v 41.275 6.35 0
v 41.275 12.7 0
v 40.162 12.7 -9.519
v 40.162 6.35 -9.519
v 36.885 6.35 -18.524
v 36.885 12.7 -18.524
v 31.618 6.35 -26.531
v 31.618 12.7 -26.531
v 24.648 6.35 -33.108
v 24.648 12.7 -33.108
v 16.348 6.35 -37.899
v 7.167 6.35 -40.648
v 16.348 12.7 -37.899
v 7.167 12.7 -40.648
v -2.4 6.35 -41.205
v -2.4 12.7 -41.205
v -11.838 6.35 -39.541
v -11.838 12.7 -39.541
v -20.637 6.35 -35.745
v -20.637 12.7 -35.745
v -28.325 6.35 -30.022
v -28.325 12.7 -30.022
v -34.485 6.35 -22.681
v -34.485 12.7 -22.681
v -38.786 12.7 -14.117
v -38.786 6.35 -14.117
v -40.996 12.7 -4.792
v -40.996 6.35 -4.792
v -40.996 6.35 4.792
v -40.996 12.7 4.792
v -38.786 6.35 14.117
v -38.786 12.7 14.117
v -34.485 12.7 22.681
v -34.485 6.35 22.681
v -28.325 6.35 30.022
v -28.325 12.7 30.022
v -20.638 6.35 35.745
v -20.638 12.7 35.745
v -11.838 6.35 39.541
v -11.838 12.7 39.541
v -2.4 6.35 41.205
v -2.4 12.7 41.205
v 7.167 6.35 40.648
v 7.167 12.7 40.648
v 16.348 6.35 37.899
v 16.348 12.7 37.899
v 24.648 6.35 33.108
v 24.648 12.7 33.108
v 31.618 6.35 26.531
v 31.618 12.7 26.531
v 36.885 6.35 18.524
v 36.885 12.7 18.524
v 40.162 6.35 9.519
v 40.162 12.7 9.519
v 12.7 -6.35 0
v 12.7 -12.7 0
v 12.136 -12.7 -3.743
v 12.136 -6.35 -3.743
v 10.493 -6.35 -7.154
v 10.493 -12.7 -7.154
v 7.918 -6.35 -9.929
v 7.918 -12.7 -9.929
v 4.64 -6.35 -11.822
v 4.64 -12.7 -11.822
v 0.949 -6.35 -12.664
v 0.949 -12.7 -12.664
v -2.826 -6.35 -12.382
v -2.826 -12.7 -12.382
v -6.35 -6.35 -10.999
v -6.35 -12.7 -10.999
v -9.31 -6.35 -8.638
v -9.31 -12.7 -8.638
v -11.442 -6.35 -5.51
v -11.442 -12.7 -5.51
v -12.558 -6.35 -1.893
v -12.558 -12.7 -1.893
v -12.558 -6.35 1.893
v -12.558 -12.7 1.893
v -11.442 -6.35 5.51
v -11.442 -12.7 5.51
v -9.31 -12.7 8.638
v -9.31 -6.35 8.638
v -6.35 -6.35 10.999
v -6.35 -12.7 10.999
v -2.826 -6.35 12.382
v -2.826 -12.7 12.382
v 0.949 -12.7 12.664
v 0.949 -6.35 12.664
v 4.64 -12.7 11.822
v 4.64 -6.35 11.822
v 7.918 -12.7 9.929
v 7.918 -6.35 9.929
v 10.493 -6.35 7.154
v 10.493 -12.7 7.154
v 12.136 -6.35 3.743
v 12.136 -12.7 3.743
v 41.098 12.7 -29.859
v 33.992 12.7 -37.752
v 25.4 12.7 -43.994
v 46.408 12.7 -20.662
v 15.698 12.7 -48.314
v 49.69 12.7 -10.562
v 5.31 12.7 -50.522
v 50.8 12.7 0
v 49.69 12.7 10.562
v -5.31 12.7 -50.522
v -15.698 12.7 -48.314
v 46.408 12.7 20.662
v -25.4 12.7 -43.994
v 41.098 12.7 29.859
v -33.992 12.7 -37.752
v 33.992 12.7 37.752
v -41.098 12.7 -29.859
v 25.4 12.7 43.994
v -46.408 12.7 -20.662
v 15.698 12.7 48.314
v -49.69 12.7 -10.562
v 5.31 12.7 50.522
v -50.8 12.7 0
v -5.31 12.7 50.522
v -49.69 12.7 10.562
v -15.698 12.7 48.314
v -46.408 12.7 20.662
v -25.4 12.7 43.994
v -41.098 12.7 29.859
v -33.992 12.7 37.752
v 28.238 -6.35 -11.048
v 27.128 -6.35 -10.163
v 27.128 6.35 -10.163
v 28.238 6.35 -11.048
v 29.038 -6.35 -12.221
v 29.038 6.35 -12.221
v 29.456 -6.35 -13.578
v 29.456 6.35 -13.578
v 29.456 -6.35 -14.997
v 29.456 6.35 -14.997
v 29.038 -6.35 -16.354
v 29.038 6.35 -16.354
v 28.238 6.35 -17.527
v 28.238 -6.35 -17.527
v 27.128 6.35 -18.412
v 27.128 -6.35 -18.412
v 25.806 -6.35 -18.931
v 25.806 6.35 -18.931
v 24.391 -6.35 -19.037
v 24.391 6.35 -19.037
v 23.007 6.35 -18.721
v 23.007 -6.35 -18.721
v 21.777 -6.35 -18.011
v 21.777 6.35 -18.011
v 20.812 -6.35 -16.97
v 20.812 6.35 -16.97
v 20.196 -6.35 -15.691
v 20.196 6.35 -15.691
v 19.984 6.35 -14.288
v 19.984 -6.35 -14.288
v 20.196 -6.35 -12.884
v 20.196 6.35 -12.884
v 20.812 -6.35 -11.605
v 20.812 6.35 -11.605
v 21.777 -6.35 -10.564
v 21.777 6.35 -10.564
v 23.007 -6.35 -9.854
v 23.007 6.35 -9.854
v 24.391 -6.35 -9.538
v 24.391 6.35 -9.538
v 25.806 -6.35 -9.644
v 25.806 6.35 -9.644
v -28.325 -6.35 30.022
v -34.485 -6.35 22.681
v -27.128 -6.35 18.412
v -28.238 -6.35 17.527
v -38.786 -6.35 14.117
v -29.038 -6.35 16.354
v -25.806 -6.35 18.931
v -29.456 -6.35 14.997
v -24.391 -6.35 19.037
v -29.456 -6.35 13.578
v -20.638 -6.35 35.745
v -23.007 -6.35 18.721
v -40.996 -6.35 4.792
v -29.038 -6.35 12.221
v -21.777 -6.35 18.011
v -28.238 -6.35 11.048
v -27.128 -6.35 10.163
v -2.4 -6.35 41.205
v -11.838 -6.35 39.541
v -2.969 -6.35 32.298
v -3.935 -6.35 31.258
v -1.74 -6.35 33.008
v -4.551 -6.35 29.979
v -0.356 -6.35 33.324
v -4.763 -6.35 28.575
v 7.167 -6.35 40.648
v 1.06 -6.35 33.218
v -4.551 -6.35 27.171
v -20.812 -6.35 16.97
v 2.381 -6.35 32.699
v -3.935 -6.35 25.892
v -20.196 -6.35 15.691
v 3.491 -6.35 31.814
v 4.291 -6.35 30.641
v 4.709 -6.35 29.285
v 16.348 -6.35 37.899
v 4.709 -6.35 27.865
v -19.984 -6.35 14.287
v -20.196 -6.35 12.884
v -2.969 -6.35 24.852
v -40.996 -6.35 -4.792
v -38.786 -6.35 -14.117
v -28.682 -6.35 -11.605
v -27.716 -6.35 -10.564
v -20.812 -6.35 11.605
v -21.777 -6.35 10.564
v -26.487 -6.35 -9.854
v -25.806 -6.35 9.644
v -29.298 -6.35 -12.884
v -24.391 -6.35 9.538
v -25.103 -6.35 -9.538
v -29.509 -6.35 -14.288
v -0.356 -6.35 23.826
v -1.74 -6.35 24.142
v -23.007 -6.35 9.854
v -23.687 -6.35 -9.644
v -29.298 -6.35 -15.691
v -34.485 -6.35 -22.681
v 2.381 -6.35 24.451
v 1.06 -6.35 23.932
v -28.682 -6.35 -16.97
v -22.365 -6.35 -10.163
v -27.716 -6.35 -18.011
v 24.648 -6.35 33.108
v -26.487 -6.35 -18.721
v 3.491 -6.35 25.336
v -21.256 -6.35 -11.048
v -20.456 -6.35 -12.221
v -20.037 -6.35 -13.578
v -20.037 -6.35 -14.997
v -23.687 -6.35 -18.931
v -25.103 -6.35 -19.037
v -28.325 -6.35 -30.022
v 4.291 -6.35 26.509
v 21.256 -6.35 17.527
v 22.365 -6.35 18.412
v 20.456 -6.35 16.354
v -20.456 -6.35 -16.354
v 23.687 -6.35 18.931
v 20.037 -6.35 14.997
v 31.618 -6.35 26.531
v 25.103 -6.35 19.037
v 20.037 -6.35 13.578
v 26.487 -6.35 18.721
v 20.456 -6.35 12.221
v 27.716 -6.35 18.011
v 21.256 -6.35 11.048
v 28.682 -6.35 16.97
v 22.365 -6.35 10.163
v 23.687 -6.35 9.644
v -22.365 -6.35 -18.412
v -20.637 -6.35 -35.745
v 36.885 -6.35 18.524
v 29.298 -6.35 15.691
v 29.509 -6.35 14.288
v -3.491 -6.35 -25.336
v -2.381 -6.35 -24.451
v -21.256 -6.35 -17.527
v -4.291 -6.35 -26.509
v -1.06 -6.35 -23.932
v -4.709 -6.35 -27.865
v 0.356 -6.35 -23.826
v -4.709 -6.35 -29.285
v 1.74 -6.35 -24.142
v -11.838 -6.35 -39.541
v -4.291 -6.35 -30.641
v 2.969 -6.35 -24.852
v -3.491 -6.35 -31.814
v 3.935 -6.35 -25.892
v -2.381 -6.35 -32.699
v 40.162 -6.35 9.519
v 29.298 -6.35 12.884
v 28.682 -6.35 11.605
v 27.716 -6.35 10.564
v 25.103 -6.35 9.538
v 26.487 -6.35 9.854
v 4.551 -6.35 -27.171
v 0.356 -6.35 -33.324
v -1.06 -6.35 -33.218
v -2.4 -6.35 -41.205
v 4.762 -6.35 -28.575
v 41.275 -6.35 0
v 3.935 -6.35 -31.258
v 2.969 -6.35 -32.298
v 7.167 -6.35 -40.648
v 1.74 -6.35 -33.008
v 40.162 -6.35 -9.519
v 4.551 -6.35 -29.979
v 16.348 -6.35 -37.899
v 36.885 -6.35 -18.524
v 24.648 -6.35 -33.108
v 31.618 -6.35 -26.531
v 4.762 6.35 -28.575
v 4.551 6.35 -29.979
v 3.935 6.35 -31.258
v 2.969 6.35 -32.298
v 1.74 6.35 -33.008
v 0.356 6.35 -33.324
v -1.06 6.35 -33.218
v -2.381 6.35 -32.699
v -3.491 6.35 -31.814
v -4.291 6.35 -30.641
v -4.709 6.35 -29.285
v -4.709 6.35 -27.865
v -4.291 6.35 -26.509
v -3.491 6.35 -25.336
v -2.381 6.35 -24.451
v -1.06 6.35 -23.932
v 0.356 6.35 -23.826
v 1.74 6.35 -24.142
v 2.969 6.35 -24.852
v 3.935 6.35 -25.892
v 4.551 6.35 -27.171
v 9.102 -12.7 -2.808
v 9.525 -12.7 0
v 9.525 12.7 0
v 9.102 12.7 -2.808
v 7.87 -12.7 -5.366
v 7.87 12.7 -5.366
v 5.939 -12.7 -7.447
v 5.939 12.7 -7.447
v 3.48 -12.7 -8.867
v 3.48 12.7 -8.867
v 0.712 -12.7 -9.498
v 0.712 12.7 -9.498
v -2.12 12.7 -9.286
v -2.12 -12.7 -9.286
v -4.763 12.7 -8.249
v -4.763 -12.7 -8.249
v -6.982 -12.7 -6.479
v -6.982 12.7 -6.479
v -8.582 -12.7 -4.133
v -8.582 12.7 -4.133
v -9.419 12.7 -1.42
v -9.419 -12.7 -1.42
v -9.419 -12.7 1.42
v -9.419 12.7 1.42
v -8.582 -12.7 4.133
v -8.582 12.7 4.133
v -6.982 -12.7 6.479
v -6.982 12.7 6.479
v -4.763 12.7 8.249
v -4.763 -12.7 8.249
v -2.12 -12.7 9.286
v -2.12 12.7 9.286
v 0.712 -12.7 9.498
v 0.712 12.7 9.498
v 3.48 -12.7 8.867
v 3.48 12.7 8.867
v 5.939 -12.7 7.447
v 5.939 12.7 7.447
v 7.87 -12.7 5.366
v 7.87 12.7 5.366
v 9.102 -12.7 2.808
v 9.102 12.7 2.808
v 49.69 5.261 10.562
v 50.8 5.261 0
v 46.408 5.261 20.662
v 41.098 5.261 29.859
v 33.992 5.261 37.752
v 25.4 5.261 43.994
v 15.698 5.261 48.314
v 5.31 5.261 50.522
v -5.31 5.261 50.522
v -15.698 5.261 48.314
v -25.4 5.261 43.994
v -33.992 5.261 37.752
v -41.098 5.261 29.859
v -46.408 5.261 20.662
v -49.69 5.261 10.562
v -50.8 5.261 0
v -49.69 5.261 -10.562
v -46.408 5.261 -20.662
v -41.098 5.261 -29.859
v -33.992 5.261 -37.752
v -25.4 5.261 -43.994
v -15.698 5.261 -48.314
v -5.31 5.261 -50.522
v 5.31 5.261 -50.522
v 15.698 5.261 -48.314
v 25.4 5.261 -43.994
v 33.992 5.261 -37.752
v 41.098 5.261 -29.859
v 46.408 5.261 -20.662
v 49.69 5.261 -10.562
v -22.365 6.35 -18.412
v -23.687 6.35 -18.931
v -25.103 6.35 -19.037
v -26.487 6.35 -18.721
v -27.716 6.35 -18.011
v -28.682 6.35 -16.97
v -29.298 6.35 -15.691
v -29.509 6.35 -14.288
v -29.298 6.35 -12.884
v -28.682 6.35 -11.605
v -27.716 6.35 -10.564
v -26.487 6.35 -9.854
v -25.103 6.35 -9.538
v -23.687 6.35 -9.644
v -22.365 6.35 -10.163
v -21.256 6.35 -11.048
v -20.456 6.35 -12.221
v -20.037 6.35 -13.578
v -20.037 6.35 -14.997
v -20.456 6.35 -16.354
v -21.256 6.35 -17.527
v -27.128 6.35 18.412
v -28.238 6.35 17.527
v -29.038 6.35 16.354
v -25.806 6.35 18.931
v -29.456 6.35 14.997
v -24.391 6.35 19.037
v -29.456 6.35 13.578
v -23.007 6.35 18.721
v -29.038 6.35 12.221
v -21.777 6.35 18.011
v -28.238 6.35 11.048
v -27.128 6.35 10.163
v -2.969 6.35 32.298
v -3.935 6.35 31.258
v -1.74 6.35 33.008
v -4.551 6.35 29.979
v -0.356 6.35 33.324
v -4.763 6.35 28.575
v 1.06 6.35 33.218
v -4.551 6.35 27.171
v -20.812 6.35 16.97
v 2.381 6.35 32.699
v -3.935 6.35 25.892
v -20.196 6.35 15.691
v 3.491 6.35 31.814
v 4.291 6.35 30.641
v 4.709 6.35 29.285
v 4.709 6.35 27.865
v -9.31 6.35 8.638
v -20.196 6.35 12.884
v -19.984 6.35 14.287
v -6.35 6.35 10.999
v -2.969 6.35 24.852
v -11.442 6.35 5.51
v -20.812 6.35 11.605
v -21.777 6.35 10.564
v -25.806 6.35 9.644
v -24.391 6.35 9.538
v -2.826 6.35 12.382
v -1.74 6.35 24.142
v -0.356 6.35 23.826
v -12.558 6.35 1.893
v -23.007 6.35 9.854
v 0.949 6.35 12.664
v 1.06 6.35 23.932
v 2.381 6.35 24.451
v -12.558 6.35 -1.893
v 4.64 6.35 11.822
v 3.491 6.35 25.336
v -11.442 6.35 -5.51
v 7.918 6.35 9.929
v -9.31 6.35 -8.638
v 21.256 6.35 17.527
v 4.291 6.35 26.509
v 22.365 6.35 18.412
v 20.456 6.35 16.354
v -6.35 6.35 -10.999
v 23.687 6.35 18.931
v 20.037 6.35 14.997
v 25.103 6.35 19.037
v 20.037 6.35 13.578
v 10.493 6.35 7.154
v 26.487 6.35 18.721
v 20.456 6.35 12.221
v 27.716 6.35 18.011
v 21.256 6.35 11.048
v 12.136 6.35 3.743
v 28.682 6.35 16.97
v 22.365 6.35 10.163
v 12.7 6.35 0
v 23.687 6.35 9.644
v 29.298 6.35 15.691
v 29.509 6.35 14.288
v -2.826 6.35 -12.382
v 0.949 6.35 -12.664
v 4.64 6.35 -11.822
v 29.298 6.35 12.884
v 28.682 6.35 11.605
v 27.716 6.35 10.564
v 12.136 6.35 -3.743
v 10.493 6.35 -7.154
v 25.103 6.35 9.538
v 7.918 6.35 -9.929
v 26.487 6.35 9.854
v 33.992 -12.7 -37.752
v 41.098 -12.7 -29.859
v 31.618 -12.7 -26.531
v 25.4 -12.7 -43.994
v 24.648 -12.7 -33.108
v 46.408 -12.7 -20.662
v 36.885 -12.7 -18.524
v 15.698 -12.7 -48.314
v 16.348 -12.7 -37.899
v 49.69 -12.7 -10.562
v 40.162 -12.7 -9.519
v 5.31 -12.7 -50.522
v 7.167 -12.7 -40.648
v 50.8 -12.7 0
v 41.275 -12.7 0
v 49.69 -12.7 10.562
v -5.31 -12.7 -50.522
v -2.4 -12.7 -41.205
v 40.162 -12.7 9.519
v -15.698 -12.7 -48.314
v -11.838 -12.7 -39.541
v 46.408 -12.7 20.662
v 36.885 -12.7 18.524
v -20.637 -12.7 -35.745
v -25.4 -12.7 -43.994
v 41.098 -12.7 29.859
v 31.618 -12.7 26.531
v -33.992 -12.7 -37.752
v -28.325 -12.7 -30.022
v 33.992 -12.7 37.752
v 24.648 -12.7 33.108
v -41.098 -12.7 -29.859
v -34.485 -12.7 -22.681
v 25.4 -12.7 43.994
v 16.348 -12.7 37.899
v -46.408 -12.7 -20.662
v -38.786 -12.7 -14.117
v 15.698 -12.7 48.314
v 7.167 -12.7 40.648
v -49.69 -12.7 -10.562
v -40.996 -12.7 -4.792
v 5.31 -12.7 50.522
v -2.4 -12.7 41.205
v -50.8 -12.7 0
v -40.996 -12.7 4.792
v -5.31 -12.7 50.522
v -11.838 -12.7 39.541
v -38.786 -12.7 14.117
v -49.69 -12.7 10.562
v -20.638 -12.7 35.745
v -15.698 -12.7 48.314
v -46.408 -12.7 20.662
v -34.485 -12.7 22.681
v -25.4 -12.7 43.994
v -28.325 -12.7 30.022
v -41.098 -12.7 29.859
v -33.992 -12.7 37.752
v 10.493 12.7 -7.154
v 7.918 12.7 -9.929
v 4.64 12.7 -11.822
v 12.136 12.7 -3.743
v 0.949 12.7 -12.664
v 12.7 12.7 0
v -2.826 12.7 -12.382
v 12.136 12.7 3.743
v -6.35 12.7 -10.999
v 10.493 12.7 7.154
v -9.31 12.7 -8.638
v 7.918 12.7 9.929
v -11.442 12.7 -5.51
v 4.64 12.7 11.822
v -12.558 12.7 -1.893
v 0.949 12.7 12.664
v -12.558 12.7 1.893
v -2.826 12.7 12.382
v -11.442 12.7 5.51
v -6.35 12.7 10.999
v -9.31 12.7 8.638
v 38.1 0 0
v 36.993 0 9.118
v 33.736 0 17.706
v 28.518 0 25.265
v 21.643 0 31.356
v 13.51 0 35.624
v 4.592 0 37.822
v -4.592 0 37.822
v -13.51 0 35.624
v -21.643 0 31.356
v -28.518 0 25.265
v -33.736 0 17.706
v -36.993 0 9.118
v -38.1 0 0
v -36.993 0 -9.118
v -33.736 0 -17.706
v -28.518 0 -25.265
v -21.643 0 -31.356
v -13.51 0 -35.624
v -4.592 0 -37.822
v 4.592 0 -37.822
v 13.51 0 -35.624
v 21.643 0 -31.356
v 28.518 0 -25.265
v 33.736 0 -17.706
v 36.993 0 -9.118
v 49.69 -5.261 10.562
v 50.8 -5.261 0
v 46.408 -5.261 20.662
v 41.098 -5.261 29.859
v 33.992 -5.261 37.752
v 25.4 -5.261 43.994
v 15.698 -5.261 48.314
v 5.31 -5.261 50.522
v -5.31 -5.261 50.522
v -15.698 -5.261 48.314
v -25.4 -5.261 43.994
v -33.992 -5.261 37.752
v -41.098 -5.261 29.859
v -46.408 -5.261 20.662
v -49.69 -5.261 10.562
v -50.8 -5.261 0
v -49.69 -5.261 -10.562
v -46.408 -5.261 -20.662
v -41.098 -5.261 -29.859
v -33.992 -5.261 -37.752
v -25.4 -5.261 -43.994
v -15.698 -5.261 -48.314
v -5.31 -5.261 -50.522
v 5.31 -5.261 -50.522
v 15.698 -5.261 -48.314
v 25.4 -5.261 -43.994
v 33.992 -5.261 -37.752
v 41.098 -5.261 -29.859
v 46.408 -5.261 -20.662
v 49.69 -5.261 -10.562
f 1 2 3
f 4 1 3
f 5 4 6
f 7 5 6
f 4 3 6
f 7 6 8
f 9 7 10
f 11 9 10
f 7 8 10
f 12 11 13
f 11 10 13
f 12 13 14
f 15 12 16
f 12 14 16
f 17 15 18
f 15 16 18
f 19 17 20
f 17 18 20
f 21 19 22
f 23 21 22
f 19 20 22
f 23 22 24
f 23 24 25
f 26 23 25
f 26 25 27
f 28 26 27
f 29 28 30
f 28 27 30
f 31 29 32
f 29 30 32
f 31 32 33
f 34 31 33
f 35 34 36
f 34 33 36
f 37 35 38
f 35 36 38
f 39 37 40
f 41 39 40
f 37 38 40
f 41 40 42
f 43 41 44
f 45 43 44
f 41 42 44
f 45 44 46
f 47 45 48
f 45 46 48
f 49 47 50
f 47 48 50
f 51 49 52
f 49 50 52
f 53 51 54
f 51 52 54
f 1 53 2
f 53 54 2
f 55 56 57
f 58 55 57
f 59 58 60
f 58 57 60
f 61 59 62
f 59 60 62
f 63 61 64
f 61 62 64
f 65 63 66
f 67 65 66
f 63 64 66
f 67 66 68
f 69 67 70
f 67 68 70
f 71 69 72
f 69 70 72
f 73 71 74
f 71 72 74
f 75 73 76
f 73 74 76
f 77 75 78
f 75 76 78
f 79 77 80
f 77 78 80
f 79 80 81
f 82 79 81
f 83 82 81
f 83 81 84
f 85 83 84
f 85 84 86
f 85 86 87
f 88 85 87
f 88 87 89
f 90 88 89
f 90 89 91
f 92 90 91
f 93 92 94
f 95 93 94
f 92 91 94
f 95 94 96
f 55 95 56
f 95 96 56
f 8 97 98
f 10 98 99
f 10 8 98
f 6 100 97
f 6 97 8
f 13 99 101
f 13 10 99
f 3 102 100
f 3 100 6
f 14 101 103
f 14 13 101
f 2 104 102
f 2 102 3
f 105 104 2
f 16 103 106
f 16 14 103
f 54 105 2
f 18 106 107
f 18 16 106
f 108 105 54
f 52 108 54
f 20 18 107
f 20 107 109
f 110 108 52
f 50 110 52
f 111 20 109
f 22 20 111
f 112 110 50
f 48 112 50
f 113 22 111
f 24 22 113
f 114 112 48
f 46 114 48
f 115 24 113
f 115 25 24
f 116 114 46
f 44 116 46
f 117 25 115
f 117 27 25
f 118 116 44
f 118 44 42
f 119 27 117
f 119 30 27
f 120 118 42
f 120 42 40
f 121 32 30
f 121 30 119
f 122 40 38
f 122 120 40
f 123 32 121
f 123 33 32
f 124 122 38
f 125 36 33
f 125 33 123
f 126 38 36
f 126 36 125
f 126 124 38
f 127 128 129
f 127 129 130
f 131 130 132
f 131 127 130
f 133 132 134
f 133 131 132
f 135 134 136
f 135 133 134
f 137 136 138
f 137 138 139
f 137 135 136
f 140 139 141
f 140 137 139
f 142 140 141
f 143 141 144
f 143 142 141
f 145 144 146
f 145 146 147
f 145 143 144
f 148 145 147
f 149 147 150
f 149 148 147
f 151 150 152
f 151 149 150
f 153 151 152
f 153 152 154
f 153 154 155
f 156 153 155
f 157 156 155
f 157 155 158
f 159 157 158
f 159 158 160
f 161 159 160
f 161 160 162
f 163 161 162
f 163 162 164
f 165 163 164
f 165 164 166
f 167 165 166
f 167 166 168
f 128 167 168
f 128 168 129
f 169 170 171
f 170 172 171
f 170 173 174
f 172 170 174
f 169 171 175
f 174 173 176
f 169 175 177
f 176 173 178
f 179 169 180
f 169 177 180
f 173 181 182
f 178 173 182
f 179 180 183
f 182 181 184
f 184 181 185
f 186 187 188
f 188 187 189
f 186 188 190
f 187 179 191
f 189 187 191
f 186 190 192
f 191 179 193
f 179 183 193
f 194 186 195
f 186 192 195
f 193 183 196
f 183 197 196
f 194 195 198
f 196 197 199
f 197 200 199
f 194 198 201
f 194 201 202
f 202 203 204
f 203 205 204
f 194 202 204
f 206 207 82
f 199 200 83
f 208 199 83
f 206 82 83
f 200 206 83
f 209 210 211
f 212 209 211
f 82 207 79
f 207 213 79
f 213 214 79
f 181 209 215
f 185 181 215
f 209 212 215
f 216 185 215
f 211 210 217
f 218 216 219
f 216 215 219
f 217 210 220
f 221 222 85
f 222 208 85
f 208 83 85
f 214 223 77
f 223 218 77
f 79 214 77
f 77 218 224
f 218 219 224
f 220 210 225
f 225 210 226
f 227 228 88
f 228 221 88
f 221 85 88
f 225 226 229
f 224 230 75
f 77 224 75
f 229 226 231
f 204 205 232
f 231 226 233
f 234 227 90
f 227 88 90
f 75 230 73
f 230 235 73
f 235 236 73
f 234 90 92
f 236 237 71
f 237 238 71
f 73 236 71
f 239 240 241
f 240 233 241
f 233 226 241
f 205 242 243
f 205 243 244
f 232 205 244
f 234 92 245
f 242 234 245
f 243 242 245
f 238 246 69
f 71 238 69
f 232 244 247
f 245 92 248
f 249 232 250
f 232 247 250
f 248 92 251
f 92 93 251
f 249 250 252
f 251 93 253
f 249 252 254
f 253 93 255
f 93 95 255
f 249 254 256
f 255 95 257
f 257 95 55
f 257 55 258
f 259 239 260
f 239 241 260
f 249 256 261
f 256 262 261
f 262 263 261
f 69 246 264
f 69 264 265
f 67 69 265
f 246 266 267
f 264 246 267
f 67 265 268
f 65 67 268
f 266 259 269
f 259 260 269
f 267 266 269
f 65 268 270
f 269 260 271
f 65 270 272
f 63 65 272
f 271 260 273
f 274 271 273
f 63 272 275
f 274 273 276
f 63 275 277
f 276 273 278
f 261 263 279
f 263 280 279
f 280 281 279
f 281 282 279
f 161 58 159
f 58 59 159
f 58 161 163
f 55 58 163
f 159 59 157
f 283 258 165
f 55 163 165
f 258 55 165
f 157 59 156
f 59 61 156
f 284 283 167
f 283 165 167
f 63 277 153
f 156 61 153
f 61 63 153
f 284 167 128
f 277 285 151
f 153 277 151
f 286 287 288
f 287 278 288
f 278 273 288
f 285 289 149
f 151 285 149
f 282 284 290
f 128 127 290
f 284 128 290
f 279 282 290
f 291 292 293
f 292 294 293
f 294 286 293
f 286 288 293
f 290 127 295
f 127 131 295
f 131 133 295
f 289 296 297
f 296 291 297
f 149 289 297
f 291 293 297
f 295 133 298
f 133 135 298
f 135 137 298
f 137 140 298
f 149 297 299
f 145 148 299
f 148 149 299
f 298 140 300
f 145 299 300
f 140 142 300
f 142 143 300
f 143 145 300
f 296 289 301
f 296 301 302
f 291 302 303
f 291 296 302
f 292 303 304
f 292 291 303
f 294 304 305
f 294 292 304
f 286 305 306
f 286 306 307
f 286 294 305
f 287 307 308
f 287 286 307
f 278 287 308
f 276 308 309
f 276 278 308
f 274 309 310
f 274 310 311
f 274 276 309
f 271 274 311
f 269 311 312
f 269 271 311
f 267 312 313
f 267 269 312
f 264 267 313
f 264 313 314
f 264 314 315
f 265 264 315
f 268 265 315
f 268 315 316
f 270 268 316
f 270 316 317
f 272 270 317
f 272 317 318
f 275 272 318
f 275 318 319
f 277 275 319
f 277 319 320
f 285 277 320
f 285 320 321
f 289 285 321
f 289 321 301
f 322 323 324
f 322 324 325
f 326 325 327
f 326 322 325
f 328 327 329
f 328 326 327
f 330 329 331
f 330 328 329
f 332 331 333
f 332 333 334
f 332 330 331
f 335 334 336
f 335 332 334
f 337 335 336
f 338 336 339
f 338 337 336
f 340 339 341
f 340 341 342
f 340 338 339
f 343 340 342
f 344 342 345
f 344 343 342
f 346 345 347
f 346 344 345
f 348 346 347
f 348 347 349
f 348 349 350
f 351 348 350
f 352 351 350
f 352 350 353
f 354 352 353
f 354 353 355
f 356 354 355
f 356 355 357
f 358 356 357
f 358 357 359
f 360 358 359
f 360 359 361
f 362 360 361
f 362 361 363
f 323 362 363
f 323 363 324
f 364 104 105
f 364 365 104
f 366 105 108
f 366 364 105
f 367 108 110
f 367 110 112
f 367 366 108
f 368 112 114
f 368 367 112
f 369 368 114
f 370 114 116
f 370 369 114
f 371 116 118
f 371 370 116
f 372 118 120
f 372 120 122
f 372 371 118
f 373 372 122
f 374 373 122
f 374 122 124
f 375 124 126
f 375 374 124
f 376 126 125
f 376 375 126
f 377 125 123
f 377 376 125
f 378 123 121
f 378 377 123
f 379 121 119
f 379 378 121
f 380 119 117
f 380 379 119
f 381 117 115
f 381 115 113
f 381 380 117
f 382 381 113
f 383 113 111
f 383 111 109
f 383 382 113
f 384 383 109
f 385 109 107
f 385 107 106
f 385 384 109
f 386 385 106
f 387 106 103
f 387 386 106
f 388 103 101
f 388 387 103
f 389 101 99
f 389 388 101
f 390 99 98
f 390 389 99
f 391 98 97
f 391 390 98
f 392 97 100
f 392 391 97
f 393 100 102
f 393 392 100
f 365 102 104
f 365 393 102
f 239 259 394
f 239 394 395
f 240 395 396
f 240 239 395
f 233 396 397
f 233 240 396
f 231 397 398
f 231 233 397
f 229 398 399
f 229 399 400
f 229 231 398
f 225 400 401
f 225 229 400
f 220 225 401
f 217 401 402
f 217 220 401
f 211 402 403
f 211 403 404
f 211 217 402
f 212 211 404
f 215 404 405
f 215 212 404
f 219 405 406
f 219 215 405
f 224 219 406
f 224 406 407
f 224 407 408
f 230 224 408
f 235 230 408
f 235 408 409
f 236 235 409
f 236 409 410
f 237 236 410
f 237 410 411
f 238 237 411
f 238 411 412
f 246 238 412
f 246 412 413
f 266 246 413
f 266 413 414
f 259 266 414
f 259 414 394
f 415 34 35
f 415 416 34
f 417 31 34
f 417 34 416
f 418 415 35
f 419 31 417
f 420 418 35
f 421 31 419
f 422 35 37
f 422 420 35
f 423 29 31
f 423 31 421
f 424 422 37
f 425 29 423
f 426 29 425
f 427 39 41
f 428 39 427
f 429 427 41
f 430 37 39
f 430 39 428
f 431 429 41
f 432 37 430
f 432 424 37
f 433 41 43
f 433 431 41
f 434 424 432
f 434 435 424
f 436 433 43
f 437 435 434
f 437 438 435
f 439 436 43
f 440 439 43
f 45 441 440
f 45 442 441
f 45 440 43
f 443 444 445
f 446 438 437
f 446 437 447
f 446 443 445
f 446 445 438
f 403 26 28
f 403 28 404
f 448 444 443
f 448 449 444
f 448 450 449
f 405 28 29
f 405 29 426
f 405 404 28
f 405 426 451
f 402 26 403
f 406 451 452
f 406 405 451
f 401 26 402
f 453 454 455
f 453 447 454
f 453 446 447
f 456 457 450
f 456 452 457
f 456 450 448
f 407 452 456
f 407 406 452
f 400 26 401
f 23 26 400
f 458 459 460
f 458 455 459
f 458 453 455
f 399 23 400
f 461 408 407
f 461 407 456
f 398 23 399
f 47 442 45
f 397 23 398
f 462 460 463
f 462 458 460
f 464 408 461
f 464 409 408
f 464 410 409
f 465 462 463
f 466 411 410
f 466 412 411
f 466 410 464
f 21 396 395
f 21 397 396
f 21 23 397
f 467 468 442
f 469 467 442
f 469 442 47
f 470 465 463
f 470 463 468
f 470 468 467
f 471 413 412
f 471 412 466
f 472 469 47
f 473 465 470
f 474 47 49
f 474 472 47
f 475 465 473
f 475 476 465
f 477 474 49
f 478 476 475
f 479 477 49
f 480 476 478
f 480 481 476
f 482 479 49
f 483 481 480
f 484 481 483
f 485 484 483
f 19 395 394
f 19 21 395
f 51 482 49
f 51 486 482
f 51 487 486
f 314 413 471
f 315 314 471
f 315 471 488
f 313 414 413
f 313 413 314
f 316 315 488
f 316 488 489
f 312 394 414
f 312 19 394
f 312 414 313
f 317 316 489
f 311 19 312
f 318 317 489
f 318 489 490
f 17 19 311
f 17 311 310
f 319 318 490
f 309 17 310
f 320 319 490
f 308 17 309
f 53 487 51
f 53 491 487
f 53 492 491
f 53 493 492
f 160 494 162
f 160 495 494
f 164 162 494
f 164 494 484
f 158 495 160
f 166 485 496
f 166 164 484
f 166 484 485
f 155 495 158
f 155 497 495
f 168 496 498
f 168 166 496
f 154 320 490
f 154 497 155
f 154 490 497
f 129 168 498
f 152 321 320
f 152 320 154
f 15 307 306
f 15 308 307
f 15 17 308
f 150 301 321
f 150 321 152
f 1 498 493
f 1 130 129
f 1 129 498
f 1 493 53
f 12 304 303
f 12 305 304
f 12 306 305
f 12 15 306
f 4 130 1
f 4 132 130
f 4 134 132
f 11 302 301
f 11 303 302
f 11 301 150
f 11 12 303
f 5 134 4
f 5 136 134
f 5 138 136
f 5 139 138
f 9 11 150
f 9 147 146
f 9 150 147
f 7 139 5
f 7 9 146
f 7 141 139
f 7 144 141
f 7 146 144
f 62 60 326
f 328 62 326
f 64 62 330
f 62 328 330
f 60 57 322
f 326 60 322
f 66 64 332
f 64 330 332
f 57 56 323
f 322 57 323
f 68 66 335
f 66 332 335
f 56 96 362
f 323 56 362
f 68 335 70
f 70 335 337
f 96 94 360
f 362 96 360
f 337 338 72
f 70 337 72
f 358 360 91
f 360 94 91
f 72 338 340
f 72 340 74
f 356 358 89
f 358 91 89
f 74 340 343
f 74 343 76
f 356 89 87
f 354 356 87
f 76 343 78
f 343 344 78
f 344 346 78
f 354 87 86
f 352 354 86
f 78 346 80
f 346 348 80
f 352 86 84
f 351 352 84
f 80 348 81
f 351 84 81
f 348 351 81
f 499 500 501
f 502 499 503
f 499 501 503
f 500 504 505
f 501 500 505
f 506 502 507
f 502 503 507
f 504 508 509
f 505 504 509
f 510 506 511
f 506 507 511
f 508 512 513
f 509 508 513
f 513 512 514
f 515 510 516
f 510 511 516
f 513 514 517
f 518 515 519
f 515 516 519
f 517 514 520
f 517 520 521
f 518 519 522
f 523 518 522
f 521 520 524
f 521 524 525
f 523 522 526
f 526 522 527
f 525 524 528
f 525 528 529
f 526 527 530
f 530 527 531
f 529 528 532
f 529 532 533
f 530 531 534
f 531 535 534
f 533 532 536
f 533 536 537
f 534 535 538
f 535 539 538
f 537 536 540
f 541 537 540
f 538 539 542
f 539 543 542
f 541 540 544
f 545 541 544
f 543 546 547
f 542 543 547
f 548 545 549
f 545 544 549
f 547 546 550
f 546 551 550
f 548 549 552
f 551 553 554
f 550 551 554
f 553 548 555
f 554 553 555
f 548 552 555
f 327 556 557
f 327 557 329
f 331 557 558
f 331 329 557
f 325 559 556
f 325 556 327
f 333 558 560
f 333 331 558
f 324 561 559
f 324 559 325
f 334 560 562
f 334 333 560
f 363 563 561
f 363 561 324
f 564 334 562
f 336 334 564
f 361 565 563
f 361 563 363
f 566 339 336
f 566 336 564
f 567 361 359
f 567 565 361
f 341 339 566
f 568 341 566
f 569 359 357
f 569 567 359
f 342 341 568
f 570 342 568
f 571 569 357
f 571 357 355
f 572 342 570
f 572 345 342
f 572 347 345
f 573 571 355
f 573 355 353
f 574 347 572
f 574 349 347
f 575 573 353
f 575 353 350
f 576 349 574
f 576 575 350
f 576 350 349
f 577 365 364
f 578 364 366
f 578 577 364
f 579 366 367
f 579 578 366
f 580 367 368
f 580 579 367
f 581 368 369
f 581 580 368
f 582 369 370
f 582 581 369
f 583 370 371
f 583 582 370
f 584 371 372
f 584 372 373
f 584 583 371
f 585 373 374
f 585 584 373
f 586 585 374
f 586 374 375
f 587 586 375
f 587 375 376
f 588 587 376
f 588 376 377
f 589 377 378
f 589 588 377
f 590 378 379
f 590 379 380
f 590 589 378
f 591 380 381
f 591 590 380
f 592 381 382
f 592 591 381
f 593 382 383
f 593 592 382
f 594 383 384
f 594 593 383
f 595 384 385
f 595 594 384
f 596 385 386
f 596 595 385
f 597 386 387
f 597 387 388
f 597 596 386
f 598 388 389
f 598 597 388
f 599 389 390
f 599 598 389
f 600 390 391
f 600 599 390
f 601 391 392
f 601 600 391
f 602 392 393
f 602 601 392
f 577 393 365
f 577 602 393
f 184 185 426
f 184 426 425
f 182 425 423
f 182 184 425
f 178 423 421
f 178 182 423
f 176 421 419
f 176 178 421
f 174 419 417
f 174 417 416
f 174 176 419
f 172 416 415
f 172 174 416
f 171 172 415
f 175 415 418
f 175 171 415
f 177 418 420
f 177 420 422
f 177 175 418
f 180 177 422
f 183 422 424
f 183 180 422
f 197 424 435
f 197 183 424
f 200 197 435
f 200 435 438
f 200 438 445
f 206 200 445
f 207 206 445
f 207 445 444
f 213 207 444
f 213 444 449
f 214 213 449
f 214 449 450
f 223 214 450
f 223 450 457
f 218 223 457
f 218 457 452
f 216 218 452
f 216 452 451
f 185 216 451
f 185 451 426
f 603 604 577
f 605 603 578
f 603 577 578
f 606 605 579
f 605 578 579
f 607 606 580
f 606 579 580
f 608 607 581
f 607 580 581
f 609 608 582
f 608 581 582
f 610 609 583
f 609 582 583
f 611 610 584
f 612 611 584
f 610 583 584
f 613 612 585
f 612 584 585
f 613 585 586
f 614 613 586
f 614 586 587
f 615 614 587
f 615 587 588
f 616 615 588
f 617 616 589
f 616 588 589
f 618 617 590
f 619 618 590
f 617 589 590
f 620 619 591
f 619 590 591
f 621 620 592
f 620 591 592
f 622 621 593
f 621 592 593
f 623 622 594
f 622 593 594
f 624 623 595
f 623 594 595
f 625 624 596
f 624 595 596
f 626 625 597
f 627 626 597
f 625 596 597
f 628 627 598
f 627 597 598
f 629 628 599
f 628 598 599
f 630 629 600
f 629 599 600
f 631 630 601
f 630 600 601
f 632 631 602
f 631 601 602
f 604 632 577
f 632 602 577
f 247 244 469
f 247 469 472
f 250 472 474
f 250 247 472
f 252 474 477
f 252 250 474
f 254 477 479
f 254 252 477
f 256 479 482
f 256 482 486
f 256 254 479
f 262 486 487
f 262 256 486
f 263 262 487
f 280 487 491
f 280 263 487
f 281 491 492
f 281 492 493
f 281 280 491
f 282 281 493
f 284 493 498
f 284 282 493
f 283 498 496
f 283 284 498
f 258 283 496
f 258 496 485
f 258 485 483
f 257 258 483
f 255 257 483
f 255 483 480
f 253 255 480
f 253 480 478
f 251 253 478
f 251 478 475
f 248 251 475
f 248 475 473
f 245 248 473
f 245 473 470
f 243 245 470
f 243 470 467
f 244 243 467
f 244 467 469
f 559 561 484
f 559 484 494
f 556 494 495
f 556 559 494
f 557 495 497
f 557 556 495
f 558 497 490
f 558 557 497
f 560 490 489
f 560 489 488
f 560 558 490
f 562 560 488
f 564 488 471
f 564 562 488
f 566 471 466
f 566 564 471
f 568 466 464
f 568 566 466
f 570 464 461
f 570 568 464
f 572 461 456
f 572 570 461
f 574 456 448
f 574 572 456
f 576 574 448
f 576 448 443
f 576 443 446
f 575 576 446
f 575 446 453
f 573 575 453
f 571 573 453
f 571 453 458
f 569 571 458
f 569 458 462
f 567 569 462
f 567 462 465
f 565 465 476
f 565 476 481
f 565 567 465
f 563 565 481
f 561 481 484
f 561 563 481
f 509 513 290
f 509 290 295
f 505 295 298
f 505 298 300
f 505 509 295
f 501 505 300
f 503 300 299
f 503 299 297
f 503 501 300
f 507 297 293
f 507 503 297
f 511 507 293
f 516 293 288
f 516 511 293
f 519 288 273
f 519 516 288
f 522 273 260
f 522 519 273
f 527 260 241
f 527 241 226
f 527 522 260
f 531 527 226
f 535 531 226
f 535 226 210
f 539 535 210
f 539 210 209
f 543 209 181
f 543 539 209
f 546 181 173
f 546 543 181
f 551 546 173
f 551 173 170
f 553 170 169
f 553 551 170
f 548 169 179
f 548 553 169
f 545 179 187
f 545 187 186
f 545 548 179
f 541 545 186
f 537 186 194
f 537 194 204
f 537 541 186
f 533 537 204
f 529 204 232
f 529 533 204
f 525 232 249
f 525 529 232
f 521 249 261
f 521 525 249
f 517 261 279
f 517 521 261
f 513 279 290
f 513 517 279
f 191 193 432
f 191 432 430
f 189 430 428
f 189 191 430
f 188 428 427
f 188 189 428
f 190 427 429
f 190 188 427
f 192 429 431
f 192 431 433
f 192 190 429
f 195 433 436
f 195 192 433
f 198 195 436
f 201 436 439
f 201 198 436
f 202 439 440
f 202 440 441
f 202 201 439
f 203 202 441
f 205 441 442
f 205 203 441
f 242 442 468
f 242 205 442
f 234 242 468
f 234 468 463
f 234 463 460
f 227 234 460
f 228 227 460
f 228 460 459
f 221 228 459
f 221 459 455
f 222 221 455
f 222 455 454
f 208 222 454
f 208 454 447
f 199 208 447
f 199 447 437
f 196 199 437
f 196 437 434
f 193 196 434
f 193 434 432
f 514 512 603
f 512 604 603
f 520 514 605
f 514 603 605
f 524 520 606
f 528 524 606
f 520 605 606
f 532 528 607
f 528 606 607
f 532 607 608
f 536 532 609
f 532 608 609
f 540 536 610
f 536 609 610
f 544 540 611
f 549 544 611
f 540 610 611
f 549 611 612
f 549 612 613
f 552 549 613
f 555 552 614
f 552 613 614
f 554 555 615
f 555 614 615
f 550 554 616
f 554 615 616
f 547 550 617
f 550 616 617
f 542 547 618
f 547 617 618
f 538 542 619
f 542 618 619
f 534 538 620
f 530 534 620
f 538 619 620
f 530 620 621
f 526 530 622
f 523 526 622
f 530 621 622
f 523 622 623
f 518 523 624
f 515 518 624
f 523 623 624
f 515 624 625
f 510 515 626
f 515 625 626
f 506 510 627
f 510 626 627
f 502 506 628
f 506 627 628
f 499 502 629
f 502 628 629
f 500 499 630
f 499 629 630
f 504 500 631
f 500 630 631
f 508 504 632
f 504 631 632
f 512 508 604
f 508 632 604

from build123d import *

# Parameters (mm, degrees)
SKETCH2_R          = 41.275
SKETCH2_R_2        = 12.7
CUT_EXTRUDE1_DEPTH = 6.35
SKETCH3_R          = 9.525
CUT_EXTRUDE2_DEPTH = 13.7
SKETCH5_R          = 4.7625
CUT_EXTRUDE3_DEPTH = 7.35
CIRPATTERN1_COUNT  = 6


with BuildPart() as part:
    # Sketch1 → Revolve1 (revolve)
    with BuildSketch(Plane.XY):
        Polygon((0, 0), (0, 12.7), (50.8, 12.7), (50.8, 5.260512242), (38.1, 0), align=None)
    revolve(axis=Axis((0, 218.832128387, 0), (0, -1, 0)))

    # Sketch2 → Cut-Extrude1 (cut)
    with BuildSketch(Plane(origin=(0, 12.7, 0), x_dir=(1, 0, 0), z_dir=(0, 1, 0))):
        Circle(SKETCH2_R)
        Circle(SKETCH2_R_2, mode=Mode.SUBTRACT)
    extrude(amount=-CUT_EXTRUDE1_DEPTH, mode=Mode.SUBTRACT)

    # Sketch3 → Cut-Extrude2 (cut, through all)
    with BuildSketch(Plane(origin=(0, 12.7, 0), x_dir=(1, 0, 0), z_dir=(0, 1, 0))):
        Circle(SKETCH3_R)
    extrude(amount=-CUT_EXTRUDE2_DEPTH, mode=Mode.SUBTRACT)

    # Sketch5 → Cut-Extrude3 (cut, through all)
    with BuildSketch(Plane(origin=(0, 6.35, 0), x_dir=(1, 0, 0), z_dir=(0, 1, 0))):
        with Locations((0, 28.575)):
            Circle(SKETCH5_R)
    cut_extrude3 = extrude(amount=-CUT_EXTRUDE3_DEPTH, mode=Mode.SUBTRACT)

    # CirPattern1: Cut-Extrude3 ×6 about axis
    cirpattern1_axis = Axis((0, 0, 0), (0, 1, 0))
    for i in range(1, CIRPATTERN1_COUNT):
        add(cut_extrude3.rotate(cirpattern1_axis, i * 360 / CIRPATTERN1_COUNT), mode=Mode.SUBTRACT)

    # Mirror1: part across plane


with BuildPart() as part_1:
    add(part.part)
    add(part.part.mirror(Plane.ZX))


solid = part_1.part
